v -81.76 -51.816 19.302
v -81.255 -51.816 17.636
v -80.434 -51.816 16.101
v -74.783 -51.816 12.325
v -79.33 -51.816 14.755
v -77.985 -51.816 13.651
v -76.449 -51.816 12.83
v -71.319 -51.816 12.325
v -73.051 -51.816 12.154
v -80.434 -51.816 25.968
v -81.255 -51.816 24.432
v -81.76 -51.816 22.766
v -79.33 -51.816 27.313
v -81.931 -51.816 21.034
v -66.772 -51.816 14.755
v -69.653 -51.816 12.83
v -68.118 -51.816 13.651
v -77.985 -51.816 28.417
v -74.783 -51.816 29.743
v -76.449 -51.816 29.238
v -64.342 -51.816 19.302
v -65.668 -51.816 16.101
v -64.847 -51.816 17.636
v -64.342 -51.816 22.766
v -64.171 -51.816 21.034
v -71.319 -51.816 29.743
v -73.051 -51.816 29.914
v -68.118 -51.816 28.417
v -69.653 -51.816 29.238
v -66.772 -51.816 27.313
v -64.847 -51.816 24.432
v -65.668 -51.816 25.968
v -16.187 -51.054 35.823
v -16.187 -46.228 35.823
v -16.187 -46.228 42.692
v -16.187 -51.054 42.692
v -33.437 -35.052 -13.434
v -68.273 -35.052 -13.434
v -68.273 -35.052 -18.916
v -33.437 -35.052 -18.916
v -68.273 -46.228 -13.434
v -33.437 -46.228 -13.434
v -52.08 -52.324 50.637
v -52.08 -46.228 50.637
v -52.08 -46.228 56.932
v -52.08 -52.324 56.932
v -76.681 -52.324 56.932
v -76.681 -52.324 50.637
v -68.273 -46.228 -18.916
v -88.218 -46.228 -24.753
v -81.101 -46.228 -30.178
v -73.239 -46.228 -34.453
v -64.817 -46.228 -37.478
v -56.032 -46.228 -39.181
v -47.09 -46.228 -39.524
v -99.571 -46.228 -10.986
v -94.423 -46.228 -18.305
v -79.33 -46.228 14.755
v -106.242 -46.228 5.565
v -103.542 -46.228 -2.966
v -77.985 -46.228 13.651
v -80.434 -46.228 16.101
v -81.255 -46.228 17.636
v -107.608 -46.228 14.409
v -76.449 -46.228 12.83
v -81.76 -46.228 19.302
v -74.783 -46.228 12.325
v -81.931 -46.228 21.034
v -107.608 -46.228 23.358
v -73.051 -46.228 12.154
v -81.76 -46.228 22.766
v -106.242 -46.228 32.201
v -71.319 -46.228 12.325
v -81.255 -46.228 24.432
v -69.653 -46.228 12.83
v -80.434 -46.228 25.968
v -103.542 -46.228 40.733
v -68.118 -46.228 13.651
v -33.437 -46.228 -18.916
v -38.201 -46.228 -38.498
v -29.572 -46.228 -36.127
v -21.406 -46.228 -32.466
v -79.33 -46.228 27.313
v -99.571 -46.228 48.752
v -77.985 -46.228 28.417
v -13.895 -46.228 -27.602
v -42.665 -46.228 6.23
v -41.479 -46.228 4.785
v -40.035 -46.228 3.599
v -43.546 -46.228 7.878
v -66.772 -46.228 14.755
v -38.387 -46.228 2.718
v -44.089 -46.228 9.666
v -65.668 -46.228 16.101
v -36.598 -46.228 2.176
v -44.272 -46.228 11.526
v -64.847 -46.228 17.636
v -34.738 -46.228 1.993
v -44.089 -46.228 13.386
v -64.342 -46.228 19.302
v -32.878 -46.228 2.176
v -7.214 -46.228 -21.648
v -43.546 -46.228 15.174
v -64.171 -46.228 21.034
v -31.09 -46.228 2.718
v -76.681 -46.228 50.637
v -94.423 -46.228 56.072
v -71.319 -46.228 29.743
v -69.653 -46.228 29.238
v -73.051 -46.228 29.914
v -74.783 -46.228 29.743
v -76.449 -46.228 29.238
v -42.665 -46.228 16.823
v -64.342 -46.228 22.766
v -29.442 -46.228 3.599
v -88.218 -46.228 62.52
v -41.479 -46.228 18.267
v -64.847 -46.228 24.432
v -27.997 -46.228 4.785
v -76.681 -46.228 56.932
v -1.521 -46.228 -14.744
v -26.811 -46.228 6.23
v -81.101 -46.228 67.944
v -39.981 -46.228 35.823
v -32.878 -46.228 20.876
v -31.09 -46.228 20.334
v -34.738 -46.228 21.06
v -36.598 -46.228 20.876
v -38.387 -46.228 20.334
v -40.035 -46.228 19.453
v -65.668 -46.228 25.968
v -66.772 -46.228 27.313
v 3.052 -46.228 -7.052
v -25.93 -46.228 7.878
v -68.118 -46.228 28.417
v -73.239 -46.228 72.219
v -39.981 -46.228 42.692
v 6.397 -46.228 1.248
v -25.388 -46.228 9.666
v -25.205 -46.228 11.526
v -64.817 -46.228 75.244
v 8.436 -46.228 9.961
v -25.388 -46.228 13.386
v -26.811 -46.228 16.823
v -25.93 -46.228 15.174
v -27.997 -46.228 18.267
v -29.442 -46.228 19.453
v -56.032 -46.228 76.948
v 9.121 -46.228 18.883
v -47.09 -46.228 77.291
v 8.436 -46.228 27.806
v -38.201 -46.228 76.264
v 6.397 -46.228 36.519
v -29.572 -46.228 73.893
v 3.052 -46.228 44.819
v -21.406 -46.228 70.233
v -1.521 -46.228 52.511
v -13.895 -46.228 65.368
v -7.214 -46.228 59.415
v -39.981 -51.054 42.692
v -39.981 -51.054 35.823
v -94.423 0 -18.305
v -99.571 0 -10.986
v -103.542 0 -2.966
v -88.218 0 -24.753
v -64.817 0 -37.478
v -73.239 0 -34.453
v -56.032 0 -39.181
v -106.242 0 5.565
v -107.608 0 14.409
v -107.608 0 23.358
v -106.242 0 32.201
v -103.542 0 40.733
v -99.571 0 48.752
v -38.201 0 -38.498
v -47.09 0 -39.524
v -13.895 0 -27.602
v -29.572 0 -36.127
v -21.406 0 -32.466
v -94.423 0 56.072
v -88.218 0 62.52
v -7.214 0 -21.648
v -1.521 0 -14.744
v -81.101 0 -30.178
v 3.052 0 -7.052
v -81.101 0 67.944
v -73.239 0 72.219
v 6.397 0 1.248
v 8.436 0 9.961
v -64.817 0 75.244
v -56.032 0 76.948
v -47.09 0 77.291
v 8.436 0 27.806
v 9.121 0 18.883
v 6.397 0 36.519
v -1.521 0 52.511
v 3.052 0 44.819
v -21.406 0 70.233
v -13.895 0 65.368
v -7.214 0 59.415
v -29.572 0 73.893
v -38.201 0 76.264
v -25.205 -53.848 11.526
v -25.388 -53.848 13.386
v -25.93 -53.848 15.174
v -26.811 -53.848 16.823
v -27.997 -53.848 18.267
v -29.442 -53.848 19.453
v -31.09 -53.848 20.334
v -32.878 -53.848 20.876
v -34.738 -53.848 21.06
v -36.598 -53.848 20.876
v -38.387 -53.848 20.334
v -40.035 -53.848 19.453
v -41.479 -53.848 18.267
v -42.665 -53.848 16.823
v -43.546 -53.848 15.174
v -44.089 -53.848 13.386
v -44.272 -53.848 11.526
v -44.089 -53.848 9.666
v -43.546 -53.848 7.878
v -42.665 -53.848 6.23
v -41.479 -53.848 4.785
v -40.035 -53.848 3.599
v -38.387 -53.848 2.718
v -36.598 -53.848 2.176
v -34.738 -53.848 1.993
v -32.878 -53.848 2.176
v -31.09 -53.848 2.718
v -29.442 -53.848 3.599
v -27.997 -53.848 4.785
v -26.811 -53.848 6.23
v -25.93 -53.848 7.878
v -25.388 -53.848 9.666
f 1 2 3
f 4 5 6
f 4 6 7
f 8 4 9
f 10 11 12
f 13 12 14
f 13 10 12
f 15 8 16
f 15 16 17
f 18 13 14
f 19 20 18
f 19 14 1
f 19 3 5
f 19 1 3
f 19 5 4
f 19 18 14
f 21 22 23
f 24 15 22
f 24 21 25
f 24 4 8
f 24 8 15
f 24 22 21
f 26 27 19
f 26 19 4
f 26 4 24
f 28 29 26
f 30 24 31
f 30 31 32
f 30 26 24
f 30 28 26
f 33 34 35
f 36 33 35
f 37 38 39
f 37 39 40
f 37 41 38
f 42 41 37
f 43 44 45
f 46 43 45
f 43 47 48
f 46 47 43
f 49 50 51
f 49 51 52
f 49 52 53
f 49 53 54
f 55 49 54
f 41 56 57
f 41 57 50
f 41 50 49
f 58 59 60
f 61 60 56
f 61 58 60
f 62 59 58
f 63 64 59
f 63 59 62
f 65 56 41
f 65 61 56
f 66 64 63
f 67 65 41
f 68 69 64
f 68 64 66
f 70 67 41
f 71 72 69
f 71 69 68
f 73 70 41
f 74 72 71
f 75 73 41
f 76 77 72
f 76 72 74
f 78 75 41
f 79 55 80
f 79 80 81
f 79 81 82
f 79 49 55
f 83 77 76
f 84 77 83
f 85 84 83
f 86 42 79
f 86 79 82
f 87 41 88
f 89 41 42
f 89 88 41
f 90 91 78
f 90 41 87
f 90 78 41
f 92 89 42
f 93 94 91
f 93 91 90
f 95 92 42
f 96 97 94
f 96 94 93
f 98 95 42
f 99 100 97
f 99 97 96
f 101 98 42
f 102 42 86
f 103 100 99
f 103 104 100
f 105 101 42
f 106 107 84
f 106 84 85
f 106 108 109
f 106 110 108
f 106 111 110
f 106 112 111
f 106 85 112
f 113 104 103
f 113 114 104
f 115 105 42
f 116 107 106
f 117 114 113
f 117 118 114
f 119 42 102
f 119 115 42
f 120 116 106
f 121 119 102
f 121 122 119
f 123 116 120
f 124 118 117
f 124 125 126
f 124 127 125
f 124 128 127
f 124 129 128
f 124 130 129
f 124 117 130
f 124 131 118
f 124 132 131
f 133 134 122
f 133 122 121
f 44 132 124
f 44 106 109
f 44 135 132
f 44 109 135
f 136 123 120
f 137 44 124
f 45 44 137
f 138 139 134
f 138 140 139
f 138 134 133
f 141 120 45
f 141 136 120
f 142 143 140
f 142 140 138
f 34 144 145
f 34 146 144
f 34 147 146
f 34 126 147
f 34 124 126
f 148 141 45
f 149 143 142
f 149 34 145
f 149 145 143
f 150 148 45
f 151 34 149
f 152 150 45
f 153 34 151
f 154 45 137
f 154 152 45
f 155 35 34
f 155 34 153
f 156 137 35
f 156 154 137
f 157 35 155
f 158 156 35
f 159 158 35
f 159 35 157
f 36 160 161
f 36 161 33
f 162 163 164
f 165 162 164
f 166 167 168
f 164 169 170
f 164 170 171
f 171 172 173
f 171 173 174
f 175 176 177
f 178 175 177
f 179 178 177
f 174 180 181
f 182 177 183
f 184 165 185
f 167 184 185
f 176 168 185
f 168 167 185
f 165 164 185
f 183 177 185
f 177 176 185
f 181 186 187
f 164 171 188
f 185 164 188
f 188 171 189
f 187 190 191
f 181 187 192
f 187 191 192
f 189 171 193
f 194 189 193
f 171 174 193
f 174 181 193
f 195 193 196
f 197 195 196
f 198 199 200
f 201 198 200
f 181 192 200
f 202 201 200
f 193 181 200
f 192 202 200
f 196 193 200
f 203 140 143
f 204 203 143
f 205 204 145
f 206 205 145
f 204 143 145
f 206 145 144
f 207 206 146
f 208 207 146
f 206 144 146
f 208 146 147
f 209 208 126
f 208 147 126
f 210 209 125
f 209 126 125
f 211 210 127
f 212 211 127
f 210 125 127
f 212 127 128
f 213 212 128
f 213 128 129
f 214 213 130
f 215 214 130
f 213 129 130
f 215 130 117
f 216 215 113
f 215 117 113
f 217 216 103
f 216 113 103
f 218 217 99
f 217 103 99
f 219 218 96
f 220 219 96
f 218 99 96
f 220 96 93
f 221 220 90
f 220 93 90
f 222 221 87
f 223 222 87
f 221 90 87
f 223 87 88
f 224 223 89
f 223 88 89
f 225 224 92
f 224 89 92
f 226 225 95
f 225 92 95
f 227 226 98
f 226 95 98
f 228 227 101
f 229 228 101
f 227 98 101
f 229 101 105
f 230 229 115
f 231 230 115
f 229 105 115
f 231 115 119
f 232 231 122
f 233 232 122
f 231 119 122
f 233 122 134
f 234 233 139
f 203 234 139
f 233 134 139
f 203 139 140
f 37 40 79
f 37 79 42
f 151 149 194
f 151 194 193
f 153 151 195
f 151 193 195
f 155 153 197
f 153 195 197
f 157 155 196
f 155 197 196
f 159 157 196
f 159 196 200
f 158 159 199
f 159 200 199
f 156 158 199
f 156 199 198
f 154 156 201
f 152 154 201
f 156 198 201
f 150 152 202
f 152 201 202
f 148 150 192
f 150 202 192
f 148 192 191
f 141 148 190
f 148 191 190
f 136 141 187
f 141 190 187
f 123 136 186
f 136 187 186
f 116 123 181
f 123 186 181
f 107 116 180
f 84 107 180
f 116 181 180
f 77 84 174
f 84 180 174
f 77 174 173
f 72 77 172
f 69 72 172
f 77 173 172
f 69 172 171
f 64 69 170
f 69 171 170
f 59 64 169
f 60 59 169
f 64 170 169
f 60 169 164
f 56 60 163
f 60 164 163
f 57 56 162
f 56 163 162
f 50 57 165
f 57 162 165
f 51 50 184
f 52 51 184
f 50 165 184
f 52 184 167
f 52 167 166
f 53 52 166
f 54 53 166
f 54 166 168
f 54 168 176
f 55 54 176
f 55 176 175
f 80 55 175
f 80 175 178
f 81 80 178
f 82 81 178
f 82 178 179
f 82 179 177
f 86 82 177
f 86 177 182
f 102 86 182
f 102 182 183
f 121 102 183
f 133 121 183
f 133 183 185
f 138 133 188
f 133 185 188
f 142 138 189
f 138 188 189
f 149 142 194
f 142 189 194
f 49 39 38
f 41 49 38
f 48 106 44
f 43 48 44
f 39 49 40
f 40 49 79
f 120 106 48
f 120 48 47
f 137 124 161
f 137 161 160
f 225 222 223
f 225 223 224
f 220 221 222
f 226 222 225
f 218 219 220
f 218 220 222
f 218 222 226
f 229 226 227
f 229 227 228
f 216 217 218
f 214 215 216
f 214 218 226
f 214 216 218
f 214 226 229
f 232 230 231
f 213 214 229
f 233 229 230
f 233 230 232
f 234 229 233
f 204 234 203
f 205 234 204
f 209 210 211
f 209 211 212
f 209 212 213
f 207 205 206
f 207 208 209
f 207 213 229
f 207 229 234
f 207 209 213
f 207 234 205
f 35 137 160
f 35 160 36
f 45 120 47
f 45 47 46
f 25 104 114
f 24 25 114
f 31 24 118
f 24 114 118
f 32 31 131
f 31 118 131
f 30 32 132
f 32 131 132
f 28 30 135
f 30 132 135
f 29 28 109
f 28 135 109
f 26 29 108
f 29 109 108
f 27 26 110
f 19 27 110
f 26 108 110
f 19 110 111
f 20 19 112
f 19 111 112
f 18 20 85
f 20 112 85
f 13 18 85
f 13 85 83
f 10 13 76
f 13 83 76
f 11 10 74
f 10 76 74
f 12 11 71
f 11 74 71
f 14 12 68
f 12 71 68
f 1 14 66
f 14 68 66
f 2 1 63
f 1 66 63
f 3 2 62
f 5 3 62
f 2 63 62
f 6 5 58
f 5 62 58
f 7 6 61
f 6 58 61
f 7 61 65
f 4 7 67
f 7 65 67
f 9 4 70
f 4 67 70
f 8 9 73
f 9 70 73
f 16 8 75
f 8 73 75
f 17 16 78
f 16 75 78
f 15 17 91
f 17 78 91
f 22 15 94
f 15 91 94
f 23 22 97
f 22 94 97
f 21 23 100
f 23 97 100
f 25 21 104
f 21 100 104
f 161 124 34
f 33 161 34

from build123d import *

# Parameters (mm, degrees)
F0_R        = 58.45034
F1_DEPTH    = 46.228
F2_W        = 24.600874
F2_H        = 6.29507
F3_DEPTH    = 6.096
F4_W        = 23.794292
F4_H        = 6.868821
F5_DEPTH    = 4.826
F6_R        = 8.879955
F7_DEPTH    = 5.588
F8_R        = 9.533495
F9_DEPTH    = 7.62
F1_FACE_R   = 58.45034
F1_FACE_R_2 = 8.879955
F1_FACE_R_3 = 9.533495
F1_FACE_W   = 24.600874
F1_FACE_H   = 6.29507
F1_FACE_W_2 = 23.794292
F1_FACE_H_2 = 6.86882
F11_DEPTH   = 6.604
F12_W       = 34.83605
F12_H       = 5.481868
F13_DEPTH   = 11.176


with BuildPart() as f1:
    # F0 (on Front) → F1 (new body)
    with BuildSketch(Plane.XZ):
        with Locations((-49.329195, 18.883251)):
            Circle(F0_R)
    extrude(amount=F1_DEPTH)

    # F2 (on face) → F3 (join)
    with BuildSketch(Plane.XZ.offset(46.228)):
        with Locations((-64.380275, 53.784102)):
            Rectangle(F2_W, F2_H)
    extrude(amount=F3_DEPTH)

    # F4 (on face) → F5 (join)
    with BuildSketch(Plane.XZ.offset(46.228)):
        with Locations((-28.083899, 39.257792)):
            Rectangle(F4_W, F4_H)
    extrude(amount=F5_DEPTH)

    # F6 (on face) → F7 (join)
    with BuildSketch(Plane.XZ.offset(46.228)):
        with Locations((-73.05108, 21.034079)):
            Circle(F6_R)
    extrude(amount=F7_DEPTH)

    # F8 (on face) → F9 (join)
    with BuildSketch(Plane.XZ.offset(46.228)):
        with Locations((-34.738239, 11.52609)):
            Circle(F8_R)
    extrude(amount=F9_DEPTH)

    # F1_face (on face) → F11 (join)
    with BuildSketch(Plane(origin=(-49.329195, -46.228, 18.883251), x_dir=(1, 0, 0), z_dir=(0, -1, 0))):
        Circle(F1_FACE_R)
        with Locations((-23.721885, 2.150828)):
            Circle(F1_FACE_R_2, mode=Mode.SUBTRACT)
        with Locations((14.590956, -7.357161)):
            Circle(F1_FACE_R_3, mode=Mode.SUBTRACT)
        with Locations((-15.05108, 34.900852)):
            Rectangle(F1_FACE_W, F1_FACE_H, mode=Mode.SUBTRACT)
        with Locations((21.245296, 20.374542)):
            Rectangle(F1_FACE_W_2, F1_FACE_H_2, mode=Mode.SUBTRACT)
    extrude(amount=-F11_DEPTH)

    # F12 (on face) → F13 (cut)
    with BuildSketch(Plane.XZ.offset(46.228)):
        with Locations((-50.854826, -16.175416)):
            Rectangle(F12_W, F12_H)
    extrude(amount=-F13_DEPTH, mode=Mode.SUBTRACT)


solid = f1.part
